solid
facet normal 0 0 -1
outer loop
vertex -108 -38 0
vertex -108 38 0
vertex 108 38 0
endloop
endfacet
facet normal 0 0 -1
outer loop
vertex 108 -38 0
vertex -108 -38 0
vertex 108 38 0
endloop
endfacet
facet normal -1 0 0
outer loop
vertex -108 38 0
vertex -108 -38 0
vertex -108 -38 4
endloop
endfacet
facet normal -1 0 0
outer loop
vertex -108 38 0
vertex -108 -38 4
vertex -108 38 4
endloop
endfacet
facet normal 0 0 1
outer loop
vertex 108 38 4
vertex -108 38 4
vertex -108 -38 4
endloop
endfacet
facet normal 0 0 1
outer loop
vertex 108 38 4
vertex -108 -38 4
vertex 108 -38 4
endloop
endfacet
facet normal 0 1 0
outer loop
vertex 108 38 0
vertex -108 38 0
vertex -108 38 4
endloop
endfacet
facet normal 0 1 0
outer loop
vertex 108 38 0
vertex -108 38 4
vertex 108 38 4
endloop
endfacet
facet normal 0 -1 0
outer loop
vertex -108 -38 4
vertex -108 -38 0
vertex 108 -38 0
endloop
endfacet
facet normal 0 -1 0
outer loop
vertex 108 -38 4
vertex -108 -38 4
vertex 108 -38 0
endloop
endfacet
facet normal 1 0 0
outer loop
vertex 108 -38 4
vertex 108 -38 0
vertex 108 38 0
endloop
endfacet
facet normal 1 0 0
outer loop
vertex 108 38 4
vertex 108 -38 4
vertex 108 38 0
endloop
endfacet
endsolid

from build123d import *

# Parameters (mm, degrees)
SKETCH003_W         = 216
SKETCH003_H         = 76
SKETCH003_W_2       = 200
SKETCH003_H_2       = 60
PAD_DEPTH           = 4
SKETCH_W            = 20
SKETCH_H            = 60
PAD001_DEPTH        = 4
LINEARPATTERN_COUNT = 10
LINEARPATTERN_PITCH = 20


with BuildPart() as part:
    # Sketch003 → Pad (new body)
    with BuildSketch(Plane.XY):
        Rectangle(SKETCH003_W, SKETCH003_H)
        Rectangle(SKETCH003_W_2, SKETCH003_H_2, mode=Mode.SUBTRACT)
    extrude(amount=PAD_DEPTH)

    # Sketch (on Face10 of Pad) → Pad001 (join)
    with BuildSketch(Plane.XY.offset(4)):
        with Locations((-90, 0)):
            Rectangle(SKETCH_W, SKETCH_H)
    pad001 = extrude(amount=-PAD001_DEPTH)

    # LinearPattern: Pad001 ×10
    with Locations(*[(i * LINEARPATTERN_PITCH, 0, 0) for i in range(1, LINEARPATTERN_COUNT)]):
        add(pad001)


solid = part.part
